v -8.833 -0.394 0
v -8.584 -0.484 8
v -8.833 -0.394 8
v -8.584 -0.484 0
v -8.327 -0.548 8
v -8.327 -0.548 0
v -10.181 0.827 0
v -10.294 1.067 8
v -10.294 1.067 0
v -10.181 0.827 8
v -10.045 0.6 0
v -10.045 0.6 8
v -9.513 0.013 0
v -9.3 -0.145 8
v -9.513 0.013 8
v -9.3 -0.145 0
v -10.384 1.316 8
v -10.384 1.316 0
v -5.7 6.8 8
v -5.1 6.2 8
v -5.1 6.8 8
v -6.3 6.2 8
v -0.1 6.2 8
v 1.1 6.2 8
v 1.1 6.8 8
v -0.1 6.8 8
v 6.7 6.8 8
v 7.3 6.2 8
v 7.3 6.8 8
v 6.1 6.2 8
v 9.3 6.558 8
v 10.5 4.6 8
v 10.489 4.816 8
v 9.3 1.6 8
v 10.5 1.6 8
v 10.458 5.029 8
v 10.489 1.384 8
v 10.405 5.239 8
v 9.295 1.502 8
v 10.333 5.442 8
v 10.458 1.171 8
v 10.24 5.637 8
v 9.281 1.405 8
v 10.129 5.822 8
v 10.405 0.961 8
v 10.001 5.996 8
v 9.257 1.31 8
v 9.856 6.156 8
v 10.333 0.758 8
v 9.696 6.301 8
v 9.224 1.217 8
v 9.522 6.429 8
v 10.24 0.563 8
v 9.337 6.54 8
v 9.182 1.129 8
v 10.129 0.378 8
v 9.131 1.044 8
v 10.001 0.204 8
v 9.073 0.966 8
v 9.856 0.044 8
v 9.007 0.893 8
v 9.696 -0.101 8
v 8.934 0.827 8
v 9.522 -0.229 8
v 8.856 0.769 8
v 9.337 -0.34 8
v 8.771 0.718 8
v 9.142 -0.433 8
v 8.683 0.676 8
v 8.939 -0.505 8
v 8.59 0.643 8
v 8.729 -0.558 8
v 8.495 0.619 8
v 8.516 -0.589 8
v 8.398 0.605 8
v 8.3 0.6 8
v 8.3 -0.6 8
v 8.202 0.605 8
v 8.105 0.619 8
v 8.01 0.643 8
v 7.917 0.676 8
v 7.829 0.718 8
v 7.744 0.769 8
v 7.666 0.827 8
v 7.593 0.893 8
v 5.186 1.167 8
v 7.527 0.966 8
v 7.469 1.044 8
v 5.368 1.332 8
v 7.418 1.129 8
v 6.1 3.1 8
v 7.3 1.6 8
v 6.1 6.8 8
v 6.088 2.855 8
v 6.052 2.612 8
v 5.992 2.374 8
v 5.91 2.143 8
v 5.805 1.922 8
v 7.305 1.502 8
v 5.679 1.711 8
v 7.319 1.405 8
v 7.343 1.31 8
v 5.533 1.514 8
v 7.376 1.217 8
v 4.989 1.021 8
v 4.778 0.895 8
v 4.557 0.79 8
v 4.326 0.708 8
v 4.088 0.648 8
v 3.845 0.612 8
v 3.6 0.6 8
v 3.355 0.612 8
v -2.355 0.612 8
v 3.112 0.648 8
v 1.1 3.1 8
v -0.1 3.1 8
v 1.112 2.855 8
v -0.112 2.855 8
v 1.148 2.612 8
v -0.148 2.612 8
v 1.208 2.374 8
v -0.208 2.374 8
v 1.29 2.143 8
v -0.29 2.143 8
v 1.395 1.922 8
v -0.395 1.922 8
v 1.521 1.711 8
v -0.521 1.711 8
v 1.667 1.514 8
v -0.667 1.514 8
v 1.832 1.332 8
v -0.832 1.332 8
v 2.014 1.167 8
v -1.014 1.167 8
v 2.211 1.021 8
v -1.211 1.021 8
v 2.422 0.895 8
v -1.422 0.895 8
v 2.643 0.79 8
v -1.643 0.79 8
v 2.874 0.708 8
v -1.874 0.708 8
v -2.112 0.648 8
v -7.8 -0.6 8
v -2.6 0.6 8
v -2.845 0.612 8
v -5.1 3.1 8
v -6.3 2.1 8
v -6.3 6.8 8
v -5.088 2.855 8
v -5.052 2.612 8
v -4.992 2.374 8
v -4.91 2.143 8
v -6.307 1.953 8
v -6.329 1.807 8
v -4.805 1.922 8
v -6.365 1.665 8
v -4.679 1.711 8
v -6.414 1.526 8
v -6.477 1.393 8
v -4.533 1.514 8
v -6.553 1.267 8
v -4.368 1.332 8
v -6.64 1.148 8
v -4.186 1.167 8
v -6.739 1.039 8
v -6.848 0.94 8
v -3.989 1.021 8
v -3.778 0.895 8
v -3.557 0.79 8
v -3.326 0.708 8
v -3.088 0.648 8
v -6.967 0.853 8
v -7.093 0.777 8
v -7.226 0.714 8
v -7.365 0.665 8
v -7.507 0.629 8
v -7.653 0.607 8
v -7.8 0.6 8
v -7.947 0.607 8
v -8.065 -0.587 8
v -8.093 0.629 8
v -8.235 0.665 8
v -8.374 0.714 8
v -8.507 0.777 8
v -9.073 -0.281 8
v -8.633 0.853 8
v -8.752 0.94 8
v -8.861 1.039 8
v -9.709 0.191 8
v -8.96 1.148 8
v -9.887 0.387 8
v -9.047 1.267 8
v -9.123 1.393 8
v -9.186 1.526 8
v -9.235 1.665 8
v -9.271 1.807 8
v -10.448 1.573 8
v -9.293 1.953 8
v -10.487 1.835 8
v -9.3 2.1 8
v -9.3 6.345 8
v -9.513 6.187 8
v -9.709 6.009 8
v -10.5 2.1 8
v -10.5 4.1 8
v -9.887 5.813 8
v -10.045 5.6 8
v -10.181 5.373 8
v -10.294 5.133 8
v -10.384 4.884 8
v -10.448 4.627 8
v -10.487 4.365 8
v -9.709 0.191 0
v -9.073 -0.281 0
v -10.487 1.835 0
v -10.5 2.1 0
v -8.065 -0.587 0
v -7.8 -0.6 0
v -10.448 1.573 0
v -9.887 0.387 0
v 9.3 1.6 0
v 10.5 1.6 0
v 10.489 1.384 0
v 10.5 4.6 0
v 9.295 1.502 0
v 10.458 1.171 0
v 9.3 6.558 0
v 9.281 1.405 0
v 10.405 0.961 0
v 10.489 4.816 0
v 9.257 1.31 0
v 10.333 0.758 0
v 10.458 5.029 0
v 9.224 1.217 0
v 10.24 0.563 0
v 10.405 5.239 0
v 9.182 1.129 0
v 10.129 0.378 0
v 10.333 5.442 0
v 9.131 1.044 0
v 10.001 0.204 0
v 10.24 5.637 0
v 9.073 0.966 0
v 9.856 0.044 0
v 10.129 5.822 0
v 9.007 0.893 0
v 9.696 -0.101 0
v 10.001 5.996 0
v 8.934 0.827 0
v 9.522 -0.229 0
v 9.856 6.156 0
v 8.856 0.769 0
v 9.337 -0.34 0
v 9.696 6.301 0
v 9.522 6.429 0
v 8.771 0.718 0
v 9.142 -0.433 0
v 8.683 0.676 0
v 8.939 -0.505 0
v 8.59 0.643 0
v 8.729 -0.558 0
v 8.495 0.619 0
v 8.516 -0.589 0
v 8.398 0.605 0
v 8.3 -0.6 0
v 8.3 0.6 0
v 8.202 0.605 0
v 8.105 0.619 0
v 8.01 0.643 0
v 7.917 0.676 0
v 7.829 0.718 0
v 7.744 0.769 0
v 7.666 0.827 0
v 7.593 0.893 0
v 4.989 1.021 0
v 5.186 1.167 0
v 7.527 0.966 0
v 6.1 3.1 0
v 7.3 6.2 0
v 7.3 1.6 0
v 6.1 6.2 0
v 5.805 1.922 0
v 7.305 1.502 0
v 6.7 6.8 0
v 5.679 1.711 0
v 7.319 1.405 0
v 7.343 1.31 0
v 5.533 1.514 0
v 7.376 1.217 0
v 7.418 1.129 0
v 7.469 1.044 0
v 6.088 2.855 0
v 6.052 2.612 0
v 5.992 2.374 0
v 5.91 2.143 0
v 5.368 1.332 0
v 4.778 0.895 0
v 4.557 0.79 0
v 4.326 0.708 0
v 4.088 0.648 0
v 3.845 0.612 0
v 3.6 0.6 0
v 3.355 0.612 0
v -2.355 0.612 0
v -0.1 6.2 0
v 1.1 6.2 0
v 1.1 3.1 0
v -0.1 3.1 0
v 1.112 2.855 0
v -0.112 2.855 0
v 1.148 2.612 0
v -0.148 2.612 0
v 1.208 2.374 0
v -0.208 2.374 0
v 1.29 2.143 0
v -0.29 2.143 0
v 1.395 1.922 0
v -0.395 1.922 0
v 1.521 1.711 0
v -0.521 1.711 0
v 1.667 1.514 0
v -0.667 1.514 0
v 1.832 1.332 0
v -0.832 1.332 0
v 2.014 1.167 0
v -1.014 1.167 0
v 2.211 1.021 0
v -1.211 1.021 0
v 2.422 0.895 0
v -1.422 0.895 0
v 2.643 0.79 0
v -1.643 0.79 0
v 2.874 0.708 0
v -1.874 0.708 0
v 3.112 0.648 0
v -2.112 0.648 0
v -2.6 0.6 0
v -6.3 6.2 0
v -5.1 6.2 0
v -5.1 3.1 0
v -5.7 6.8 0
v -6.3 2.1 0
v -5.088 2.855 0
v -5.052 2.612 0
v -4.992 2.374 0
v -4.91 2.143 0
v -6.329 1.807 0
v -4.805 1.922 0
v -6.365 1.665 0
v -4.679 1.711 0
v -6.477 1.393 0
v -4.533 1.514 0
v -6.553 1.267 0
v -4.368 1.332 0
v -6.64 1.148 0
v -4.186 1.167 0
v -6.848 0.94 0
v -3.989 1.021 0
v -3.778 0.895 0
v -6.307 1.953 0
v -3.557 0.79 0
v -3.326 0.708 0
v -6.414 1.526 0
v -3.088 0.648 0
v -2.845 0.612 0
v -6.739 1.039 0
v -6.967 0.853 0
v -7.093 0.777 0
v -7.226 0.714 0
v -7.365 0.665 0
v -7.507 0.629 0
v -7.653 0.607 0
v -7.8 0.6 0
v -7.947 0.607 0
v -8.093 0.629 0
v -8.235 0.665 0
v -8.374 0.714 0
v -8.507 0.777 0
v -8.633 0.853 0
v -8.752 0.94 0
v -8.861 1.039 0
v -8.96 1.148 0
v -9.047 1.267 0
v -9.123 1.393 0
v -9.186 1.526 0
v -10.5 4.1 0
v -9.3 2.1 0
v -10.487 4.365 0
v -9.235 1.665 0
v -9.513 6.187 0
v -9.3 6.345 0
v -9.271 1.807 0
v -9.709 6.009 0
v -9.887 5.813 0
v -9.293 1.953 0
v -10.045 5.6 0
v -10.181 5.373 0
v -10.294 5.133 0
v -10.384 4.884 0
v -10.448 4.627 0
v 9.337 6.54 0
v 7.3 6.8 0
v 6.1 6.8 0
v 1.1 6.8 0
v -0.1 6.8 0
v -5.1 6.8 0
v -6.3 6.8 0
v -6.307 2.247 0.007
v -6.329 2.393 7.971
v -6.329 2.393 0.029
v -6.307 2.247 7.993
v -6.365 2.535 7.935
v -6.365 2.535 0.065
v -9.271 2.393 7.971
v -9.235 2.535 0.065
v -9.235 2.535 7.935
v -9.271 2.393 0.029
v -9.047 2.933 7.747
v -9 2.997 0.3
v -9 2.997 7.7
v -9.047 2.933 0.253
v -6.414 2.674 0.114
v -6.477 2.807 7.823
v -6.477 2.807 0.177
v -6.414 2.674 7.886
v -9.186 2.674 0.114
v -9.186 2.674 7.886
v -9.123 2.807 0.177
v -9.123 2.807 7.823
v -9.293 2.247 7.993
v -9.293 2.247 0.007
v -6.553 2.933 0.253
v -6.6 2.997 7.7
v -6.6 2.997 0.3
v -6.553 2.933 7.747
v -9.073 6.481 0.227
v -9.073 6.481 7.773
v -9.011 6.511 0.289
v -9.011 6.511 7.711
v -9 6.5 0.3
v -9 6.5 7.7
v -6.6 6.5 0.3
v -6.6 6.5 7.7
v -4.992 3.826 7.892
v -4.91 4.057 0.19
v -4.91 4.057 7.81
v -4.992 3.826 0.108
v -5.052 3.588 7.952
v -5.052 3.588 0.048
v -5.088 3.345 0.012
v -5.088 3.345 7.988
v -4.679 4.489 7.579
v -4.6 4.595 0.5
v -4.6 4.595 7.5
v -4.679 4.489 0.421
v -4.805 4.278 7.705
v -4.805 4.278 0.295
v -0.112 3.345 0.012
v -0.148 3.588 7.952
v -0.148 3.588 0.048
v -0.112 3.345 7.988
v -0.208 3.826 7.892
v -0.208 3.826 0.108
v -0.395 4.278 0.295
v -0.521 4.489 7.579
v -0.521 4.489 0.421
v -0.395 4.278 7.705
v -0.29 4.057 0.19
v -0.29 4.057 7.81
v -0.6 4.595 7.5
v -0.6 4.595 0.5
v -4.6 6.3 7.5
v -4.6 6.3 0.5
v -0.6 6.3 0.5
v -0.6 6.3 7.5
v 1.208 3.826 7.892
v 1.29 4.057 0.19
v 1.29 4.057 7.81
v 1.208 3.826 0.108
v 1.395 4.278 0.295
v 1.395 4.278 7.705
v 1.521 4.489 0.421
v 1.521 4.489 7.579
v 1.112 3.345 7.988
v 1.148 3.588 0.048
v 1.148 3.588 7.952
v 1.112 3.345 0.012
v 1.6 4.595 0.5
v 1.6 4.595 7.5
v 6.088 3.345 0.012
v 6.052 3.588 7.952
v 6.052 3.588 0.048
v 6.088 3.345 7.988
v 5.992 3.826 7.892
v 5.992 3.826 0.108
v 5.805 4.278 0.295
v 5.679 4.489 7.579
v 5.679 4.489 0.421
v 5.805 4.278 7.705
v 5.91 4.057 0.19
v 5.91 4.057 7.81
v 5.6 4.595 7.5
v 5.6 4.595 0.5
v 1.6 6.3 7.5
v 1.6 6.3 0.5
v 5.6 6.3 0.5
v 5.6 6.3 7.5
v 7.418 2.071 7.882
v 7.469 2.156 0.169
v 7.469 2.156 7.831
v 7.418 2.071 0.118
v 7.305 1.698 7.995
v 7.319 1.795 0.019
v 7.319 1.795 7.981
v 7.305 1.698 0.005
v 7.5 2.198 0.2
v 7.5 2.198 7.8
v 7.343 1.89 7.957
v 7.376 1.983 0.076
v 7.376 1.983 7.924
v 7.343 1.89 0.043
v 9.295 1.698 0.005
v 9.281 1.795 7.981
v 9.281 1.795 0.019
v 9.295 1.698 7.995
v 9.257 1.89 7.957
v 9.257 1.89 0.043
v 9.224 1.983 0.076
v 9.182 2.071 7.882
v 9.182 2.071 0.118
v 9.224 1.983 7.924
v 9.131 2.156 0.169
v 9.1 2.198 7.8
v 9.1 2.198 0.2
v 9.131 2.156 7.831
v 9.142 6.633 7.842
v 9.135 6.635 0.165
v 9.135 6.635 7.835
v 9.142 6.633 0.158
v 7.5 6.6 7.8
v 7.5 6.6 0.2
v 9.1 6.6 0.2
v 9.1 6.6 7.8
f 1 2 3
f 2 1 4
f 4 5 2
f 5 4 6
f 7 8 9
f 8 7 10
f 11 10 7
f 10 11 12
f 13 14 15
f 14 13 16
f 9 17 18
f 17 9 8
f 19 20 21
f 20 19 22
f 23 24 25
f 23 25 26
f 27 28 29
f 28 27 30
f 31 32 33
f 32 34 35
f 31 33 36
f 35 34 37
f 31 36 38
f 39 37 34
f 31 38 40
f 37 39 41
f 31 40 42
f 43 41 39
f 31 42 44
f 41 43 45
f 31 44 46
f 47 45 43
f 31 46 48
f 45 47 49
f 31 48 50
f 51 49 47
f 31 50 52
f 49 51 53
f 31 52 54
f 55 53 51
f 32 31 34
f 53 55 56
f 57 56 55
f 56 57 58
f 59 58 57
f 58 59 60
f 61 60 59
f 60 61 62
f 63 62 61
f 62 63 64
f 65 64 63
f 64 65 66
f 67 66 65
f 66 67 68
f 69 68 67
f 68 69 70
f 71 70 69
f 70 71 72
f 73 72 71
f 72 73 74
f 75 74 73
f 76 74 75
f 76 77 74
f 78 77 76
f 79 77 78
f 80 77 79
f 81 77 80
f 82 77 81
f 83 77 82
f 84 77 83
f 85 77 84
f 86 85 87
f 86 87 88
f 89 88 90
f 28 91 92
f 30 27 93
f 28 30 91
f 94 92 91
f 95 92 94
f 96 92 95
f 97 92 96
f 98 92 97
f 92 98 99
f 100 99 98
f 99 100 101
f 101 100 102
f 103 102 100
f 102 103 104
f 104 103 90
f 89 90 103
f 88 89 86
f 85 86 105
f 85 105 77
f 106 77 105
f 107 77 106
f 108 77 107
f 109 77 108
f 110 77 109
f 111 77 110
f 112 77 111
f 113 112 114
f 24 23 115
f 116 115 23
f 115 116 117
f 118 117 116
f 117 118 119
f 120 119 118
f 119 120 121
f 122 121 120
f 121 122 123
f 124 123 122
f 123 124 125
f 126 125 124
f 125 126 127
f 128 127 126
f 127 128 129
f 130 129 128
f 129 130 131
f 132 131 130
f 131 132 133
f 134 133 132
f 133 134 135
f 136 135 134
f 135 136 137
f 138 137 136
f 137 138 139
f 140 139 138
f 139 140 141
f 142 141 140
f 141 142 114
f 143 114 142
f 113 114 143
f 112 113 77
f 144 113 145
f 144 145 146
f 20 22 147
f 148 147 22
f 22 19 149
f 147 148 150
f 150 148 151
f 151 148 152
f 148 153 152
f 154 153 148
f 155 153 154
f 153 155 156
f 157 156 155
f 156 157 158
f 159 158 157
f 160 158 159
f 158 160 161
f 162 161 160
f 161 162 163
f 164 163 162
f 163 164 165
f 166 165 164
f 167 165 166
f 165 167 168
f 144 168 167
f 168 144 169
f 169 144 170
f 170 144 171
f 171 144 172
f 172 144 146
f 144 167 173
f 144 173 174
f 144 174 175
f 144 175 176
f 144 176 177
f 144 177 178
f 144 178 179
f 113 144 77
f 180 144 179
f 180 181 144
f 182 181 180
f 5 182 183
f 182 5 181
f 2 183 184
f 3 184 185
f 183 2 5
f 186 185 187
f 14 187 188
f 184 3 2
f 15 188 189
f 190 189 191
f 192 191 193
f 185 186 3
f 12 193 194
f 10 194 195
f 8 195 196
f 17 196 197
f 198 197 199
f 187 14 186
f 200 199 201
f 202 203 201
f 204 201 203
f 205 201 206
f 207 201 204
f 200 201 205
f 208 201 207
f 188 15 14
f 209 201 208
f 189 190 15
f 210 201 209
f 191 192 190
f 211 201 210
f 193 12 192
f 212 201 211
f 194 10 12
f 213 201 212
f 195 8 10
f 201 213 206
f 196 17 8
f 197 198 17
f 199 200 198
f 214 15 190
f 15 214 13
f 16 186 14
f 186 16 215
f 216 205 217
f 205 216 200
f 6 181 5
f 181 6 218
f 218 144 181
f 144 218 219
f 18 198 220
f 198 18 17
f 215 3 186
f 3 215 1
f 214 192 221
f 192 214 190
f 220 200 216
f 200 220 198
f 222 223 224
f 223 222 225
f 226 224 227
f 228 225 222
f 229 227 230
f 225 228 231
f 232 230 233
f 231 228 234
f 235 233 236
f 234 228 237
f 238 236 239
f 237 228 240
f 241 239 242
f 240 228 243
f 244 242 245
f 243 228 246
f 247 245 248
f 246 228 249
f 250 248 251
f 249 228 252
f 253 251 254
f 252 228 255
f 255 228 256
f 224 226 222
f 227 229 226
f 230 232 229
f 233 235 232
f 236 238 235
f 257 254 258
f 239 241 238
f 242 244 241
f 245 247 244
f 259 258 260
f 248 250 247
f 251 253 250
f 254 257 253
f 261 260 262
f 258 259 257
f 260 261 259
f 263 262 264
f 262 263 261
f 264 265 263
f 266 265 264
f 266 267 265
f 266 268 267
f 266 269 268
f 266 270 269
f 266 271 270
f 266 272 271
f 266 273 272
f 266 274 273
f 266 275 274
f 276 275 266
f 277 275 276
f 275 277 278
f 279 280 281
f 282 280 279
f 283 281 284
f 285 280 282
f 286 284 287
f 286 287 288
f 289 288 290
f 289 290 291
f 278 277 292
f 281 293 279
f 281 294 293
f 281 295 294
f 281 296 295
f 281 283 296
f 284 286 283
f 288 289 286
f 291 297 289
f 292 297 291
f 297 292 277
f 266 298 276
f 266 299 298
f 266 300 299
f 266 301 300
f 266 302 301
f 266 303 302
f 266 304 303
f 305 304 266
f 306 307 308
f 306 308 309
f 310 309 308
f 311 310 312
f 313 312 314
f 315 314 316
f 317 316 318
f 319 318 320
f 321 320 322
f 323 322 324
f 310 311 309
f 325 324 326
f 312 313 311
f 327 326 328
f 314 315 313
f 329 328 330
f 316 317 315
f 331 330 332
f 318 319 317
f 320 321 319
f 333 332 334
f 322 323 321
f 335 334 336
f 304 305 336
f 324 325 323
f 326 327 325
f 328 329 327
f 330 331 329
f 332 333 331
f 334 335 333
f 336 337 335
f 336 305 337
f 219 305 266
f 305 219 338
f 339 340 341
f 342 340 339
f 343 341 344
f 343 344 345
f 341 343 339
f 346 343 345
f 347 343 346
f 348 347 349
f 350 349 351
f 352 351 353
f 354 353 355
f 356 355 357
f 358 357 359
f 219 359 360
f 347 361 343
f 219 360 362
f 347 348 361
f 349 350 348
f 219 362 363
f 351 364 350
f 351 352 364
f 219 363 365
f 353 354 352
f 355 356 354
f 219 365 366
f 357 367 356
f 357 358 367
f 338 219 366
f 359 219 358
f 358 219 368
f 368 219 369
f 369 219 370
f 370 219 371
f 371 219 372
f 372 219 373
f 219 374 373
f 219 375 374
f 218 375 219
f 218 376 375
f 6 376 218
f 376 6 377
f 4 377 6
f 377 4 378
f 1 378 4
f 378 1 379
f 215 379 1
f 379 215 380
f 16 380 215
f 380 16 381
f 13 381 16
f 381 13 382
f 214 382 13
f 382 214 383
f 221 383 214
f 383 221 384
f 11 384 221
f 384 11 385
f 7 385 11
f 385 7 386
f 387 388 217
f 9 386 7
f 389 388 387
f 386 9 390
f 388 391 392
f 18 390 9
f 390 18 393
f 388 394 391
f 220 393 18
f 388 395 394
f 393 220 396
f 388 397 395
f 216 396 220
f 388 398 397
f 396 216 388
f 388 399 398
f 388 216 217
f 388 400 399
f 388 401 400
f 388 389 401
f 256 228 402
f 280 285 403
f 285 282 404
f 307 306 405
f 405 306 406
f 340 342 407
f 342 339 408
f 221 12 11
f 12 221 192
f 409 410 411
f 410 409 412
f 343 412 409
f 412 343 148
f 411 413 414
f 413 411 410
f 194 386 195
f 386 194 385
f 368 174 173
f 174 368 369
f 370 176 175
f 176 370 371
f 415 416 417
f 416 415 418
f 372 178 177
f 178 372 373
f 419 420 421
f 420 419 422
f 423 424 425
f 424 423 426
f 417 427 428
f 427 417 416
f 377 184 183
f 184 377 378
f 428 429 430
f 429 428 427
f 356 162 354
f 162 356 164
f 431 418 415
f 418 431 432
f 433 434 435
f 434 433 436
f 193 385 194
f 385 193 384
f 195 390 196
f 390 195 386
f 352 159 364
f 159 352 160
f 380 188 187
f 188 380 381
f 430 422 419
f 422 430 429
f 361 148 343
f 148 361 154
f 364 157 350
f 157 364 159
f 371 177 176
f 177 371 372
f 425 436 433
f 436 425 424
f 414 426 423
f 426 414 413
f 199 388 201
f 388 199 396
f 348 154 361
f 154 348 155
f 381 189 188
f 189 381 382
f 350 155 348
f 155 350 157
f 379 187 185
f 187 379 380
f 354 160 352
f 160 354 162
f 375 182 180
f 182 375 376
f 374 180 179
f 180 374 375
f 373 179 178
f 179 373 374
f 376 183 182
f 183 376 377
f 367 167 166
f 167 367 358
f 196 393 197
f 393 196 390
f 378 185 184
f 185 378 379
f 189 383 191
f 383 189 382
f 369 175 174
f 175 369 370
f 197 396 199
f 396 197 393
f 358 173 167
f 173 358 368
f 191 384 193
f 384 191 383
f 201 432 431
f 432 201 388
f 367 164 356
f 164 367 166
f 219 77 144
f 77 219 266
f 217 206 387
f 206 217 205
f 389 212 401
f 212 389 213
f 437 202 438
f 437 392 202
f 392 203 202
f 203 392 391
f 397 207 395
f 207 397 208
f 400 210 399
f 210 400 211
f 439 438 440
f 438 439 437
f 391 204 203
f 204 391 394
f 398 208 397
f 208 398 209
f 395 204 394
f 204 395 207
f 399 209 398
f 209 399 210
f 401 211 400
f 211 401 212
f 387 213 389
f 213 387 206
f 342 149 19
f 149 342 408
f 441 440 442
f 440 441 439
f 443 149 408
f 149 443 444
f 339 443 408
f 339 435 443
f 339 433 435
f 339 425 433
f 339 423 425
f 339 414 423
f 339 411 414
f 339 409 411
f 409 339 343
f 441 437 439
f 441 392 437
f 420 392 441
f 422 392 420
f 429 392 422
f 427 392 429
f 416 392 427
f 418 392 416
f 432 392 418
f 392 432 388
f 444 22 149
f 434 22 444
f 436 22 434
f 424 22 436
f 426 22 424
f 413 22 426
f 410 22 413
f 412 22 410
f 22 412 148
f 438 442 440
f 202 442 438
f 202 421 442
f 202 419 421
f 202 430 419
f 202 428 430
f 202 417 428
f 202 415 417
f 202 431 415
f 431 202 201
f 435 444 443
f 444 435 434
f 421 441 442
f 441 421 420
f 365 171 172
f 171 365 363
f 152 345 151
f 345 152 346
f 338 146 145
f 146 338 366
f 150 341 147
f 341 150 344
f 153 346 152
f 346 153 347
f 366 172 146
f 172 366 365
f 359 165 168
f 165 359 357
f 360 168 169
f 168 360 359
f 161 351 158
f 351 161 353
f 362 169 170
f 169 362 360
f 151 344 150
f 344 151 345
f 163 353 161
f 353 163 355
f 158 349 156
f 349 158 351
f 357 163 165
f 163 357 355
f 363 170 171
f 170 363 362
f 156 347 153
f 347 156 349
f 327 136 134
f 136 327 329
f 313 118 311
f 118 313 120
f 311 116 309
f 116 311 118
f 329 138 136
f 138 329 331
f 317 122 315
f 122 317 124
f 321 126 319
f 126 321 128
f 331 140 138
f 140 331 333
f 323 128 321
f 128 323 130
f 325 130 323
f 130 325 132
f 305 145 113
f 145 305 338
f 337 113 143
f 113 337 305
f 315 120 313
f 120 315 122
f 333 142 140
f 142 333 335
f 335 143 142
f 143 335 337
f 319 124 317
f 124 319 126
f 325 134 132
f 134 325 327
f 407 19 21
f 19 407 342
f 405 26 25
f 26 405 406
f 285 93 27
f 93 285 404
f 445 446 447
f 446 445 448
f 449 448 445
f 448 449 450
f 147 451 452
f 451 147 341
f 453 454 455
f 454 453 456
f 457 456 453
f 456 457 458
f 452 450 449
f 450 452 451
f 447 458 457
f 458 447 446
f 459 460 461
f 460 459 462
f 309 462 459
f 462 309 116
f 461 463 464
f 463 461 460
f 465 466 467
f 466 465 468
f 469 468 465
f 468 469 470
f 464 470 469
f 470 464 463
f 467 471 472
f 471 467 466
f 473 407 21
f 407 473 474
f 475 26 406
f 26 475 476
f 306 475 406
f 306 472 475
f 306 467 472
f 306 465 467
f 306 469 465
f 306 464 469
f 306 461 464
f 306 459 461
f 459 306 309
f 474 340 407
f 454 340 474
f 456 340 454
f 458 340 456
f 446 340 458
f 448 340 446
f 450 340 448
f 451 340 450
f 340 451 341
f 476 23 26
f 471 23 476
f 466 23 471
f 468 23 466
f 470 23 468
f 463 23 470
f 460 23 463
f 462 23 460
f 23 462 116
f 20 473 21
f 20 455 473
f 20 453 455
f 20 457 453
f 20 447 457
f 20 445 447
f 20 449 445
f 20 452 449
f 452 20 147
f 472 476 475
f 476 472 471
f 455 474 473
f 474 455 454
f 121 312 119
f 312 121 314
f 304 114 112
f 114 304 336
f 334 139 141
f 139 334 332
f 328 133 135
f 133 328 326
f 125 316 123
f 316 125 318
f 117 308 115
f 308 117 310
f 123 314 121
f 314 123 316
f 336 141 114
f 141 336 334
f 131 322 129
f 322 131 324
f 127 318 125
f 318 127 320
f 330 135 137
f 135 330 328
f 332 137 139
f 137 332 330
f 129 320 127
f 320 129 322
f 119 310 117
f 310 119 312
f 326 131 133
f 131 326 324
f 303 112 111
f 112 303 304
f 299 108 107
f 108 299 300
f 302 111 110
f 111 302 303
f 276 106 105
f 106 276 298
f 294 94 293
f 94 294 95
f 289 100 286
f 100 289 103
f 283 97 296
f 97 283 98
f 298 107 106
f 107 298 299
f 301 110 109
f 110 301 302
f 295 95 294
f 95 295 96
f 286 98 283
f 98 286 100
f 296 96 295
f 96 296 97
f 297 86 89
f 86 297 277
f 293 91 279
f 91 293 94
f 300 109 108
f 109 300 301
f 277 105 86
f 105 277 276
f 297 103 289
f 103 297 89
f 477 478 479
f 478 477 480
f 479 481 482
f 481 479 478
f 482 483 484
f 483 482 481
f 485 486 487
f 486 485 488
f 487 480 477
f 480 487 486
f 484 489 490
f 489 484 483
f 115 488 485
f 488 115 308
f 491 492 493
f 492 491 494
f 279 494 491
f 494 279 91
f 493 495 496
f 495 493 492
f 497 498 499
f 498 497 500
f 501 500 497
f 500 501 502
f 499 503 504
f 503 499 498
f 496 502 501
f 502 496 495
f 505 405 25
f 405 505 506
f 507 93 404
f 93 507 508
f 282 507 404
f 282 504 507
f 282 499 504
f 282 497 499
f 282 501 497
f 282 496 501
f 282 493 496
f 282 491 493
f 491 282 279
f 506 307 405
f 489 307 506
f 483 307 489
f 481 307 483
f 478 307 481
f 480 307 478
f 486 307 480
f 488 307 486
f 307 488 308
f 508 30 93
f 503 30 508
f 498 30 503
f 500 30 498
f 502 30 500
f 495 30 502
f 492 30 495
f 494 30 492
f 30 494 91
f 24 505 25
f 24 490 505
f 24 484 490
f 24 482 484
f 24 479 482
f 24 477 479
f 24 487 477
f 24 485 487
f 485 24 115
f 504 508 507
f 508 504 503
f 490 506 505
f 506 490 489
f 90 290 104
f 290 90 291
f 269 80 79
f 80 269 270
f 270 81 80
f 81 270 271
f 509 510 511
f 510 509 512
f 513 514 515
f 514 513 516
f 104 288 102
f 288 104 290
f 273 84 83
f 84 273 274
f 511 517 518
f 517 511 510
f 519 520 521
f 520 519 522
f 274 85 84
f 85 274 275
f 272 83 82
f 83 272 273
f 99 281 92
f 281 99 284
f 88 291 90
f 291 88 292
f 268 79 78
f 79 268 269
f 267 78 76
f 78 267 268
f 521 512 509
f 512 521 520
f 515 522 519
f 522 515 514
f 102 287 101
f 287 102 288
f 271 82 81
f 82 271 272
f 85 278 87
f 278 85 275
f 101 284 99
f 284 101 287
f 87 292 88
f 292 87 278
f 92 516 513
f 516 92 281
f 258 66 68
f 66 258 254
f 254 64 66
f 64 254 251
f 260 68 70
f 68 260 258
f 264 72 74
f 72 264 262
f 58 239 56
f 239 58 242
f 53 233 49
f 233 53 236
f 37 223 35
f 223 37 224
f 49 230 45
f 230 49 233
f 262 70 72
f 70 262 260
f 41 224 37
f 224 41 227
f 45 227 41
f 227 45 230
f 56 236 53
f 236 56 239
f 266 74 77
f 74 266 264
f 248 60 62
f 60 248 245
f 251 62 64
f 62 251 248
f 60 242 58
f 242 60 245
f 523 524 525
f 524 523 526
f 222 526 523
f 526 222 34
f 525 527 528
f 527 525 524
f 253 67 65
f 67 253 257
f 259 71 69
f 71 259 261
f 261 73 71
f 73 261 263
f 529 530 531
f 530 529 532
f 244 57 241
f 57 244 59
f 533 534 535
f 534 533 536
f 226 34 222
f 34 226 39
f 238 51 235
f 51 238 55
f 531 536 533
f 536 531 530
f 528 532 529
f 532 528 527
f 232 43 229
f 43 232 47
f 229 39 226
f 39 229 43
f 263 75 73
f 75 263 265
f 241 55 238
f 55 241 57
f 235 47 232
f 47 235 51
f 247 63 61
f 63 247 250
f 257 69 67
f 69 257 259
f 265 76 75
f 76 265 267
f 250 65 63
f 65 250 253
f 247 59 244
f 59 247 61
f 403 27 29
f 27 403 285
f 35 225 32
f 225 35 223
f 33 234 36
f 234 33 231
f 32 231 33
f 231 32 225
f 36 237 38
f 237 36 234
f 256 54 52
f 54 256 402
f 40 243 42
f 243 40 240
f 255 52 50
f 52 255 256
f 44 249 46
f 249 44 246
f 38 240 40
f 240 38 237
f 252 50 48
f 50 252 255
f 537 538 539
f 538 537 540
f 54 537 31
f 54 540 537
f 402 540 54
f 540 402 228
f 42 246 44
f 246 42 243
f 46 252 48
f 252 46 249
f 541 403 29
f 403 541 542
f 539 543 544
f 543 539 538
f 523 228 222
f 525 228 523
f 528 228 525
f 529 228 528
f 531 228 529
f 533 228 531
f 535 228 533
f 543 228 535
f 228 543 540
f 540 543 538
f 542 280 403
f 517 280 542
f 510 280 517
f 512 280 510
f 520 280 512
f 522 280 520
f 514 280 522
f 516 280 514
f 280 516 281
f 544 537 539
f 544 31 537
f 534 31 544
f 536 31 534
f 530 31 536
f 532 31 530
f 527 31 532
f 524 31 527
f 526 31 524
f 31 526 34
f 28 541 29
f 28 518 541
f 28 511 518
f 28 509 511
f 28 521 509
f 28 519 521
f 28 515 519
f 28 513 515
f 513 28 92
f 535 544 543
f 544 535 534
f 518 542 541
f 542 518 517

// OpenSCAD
include <../utp-cable-organizer.scad>

// Example A1: Basic usage with default settings
settings_cables_dia = [[3,5,5,2]];
